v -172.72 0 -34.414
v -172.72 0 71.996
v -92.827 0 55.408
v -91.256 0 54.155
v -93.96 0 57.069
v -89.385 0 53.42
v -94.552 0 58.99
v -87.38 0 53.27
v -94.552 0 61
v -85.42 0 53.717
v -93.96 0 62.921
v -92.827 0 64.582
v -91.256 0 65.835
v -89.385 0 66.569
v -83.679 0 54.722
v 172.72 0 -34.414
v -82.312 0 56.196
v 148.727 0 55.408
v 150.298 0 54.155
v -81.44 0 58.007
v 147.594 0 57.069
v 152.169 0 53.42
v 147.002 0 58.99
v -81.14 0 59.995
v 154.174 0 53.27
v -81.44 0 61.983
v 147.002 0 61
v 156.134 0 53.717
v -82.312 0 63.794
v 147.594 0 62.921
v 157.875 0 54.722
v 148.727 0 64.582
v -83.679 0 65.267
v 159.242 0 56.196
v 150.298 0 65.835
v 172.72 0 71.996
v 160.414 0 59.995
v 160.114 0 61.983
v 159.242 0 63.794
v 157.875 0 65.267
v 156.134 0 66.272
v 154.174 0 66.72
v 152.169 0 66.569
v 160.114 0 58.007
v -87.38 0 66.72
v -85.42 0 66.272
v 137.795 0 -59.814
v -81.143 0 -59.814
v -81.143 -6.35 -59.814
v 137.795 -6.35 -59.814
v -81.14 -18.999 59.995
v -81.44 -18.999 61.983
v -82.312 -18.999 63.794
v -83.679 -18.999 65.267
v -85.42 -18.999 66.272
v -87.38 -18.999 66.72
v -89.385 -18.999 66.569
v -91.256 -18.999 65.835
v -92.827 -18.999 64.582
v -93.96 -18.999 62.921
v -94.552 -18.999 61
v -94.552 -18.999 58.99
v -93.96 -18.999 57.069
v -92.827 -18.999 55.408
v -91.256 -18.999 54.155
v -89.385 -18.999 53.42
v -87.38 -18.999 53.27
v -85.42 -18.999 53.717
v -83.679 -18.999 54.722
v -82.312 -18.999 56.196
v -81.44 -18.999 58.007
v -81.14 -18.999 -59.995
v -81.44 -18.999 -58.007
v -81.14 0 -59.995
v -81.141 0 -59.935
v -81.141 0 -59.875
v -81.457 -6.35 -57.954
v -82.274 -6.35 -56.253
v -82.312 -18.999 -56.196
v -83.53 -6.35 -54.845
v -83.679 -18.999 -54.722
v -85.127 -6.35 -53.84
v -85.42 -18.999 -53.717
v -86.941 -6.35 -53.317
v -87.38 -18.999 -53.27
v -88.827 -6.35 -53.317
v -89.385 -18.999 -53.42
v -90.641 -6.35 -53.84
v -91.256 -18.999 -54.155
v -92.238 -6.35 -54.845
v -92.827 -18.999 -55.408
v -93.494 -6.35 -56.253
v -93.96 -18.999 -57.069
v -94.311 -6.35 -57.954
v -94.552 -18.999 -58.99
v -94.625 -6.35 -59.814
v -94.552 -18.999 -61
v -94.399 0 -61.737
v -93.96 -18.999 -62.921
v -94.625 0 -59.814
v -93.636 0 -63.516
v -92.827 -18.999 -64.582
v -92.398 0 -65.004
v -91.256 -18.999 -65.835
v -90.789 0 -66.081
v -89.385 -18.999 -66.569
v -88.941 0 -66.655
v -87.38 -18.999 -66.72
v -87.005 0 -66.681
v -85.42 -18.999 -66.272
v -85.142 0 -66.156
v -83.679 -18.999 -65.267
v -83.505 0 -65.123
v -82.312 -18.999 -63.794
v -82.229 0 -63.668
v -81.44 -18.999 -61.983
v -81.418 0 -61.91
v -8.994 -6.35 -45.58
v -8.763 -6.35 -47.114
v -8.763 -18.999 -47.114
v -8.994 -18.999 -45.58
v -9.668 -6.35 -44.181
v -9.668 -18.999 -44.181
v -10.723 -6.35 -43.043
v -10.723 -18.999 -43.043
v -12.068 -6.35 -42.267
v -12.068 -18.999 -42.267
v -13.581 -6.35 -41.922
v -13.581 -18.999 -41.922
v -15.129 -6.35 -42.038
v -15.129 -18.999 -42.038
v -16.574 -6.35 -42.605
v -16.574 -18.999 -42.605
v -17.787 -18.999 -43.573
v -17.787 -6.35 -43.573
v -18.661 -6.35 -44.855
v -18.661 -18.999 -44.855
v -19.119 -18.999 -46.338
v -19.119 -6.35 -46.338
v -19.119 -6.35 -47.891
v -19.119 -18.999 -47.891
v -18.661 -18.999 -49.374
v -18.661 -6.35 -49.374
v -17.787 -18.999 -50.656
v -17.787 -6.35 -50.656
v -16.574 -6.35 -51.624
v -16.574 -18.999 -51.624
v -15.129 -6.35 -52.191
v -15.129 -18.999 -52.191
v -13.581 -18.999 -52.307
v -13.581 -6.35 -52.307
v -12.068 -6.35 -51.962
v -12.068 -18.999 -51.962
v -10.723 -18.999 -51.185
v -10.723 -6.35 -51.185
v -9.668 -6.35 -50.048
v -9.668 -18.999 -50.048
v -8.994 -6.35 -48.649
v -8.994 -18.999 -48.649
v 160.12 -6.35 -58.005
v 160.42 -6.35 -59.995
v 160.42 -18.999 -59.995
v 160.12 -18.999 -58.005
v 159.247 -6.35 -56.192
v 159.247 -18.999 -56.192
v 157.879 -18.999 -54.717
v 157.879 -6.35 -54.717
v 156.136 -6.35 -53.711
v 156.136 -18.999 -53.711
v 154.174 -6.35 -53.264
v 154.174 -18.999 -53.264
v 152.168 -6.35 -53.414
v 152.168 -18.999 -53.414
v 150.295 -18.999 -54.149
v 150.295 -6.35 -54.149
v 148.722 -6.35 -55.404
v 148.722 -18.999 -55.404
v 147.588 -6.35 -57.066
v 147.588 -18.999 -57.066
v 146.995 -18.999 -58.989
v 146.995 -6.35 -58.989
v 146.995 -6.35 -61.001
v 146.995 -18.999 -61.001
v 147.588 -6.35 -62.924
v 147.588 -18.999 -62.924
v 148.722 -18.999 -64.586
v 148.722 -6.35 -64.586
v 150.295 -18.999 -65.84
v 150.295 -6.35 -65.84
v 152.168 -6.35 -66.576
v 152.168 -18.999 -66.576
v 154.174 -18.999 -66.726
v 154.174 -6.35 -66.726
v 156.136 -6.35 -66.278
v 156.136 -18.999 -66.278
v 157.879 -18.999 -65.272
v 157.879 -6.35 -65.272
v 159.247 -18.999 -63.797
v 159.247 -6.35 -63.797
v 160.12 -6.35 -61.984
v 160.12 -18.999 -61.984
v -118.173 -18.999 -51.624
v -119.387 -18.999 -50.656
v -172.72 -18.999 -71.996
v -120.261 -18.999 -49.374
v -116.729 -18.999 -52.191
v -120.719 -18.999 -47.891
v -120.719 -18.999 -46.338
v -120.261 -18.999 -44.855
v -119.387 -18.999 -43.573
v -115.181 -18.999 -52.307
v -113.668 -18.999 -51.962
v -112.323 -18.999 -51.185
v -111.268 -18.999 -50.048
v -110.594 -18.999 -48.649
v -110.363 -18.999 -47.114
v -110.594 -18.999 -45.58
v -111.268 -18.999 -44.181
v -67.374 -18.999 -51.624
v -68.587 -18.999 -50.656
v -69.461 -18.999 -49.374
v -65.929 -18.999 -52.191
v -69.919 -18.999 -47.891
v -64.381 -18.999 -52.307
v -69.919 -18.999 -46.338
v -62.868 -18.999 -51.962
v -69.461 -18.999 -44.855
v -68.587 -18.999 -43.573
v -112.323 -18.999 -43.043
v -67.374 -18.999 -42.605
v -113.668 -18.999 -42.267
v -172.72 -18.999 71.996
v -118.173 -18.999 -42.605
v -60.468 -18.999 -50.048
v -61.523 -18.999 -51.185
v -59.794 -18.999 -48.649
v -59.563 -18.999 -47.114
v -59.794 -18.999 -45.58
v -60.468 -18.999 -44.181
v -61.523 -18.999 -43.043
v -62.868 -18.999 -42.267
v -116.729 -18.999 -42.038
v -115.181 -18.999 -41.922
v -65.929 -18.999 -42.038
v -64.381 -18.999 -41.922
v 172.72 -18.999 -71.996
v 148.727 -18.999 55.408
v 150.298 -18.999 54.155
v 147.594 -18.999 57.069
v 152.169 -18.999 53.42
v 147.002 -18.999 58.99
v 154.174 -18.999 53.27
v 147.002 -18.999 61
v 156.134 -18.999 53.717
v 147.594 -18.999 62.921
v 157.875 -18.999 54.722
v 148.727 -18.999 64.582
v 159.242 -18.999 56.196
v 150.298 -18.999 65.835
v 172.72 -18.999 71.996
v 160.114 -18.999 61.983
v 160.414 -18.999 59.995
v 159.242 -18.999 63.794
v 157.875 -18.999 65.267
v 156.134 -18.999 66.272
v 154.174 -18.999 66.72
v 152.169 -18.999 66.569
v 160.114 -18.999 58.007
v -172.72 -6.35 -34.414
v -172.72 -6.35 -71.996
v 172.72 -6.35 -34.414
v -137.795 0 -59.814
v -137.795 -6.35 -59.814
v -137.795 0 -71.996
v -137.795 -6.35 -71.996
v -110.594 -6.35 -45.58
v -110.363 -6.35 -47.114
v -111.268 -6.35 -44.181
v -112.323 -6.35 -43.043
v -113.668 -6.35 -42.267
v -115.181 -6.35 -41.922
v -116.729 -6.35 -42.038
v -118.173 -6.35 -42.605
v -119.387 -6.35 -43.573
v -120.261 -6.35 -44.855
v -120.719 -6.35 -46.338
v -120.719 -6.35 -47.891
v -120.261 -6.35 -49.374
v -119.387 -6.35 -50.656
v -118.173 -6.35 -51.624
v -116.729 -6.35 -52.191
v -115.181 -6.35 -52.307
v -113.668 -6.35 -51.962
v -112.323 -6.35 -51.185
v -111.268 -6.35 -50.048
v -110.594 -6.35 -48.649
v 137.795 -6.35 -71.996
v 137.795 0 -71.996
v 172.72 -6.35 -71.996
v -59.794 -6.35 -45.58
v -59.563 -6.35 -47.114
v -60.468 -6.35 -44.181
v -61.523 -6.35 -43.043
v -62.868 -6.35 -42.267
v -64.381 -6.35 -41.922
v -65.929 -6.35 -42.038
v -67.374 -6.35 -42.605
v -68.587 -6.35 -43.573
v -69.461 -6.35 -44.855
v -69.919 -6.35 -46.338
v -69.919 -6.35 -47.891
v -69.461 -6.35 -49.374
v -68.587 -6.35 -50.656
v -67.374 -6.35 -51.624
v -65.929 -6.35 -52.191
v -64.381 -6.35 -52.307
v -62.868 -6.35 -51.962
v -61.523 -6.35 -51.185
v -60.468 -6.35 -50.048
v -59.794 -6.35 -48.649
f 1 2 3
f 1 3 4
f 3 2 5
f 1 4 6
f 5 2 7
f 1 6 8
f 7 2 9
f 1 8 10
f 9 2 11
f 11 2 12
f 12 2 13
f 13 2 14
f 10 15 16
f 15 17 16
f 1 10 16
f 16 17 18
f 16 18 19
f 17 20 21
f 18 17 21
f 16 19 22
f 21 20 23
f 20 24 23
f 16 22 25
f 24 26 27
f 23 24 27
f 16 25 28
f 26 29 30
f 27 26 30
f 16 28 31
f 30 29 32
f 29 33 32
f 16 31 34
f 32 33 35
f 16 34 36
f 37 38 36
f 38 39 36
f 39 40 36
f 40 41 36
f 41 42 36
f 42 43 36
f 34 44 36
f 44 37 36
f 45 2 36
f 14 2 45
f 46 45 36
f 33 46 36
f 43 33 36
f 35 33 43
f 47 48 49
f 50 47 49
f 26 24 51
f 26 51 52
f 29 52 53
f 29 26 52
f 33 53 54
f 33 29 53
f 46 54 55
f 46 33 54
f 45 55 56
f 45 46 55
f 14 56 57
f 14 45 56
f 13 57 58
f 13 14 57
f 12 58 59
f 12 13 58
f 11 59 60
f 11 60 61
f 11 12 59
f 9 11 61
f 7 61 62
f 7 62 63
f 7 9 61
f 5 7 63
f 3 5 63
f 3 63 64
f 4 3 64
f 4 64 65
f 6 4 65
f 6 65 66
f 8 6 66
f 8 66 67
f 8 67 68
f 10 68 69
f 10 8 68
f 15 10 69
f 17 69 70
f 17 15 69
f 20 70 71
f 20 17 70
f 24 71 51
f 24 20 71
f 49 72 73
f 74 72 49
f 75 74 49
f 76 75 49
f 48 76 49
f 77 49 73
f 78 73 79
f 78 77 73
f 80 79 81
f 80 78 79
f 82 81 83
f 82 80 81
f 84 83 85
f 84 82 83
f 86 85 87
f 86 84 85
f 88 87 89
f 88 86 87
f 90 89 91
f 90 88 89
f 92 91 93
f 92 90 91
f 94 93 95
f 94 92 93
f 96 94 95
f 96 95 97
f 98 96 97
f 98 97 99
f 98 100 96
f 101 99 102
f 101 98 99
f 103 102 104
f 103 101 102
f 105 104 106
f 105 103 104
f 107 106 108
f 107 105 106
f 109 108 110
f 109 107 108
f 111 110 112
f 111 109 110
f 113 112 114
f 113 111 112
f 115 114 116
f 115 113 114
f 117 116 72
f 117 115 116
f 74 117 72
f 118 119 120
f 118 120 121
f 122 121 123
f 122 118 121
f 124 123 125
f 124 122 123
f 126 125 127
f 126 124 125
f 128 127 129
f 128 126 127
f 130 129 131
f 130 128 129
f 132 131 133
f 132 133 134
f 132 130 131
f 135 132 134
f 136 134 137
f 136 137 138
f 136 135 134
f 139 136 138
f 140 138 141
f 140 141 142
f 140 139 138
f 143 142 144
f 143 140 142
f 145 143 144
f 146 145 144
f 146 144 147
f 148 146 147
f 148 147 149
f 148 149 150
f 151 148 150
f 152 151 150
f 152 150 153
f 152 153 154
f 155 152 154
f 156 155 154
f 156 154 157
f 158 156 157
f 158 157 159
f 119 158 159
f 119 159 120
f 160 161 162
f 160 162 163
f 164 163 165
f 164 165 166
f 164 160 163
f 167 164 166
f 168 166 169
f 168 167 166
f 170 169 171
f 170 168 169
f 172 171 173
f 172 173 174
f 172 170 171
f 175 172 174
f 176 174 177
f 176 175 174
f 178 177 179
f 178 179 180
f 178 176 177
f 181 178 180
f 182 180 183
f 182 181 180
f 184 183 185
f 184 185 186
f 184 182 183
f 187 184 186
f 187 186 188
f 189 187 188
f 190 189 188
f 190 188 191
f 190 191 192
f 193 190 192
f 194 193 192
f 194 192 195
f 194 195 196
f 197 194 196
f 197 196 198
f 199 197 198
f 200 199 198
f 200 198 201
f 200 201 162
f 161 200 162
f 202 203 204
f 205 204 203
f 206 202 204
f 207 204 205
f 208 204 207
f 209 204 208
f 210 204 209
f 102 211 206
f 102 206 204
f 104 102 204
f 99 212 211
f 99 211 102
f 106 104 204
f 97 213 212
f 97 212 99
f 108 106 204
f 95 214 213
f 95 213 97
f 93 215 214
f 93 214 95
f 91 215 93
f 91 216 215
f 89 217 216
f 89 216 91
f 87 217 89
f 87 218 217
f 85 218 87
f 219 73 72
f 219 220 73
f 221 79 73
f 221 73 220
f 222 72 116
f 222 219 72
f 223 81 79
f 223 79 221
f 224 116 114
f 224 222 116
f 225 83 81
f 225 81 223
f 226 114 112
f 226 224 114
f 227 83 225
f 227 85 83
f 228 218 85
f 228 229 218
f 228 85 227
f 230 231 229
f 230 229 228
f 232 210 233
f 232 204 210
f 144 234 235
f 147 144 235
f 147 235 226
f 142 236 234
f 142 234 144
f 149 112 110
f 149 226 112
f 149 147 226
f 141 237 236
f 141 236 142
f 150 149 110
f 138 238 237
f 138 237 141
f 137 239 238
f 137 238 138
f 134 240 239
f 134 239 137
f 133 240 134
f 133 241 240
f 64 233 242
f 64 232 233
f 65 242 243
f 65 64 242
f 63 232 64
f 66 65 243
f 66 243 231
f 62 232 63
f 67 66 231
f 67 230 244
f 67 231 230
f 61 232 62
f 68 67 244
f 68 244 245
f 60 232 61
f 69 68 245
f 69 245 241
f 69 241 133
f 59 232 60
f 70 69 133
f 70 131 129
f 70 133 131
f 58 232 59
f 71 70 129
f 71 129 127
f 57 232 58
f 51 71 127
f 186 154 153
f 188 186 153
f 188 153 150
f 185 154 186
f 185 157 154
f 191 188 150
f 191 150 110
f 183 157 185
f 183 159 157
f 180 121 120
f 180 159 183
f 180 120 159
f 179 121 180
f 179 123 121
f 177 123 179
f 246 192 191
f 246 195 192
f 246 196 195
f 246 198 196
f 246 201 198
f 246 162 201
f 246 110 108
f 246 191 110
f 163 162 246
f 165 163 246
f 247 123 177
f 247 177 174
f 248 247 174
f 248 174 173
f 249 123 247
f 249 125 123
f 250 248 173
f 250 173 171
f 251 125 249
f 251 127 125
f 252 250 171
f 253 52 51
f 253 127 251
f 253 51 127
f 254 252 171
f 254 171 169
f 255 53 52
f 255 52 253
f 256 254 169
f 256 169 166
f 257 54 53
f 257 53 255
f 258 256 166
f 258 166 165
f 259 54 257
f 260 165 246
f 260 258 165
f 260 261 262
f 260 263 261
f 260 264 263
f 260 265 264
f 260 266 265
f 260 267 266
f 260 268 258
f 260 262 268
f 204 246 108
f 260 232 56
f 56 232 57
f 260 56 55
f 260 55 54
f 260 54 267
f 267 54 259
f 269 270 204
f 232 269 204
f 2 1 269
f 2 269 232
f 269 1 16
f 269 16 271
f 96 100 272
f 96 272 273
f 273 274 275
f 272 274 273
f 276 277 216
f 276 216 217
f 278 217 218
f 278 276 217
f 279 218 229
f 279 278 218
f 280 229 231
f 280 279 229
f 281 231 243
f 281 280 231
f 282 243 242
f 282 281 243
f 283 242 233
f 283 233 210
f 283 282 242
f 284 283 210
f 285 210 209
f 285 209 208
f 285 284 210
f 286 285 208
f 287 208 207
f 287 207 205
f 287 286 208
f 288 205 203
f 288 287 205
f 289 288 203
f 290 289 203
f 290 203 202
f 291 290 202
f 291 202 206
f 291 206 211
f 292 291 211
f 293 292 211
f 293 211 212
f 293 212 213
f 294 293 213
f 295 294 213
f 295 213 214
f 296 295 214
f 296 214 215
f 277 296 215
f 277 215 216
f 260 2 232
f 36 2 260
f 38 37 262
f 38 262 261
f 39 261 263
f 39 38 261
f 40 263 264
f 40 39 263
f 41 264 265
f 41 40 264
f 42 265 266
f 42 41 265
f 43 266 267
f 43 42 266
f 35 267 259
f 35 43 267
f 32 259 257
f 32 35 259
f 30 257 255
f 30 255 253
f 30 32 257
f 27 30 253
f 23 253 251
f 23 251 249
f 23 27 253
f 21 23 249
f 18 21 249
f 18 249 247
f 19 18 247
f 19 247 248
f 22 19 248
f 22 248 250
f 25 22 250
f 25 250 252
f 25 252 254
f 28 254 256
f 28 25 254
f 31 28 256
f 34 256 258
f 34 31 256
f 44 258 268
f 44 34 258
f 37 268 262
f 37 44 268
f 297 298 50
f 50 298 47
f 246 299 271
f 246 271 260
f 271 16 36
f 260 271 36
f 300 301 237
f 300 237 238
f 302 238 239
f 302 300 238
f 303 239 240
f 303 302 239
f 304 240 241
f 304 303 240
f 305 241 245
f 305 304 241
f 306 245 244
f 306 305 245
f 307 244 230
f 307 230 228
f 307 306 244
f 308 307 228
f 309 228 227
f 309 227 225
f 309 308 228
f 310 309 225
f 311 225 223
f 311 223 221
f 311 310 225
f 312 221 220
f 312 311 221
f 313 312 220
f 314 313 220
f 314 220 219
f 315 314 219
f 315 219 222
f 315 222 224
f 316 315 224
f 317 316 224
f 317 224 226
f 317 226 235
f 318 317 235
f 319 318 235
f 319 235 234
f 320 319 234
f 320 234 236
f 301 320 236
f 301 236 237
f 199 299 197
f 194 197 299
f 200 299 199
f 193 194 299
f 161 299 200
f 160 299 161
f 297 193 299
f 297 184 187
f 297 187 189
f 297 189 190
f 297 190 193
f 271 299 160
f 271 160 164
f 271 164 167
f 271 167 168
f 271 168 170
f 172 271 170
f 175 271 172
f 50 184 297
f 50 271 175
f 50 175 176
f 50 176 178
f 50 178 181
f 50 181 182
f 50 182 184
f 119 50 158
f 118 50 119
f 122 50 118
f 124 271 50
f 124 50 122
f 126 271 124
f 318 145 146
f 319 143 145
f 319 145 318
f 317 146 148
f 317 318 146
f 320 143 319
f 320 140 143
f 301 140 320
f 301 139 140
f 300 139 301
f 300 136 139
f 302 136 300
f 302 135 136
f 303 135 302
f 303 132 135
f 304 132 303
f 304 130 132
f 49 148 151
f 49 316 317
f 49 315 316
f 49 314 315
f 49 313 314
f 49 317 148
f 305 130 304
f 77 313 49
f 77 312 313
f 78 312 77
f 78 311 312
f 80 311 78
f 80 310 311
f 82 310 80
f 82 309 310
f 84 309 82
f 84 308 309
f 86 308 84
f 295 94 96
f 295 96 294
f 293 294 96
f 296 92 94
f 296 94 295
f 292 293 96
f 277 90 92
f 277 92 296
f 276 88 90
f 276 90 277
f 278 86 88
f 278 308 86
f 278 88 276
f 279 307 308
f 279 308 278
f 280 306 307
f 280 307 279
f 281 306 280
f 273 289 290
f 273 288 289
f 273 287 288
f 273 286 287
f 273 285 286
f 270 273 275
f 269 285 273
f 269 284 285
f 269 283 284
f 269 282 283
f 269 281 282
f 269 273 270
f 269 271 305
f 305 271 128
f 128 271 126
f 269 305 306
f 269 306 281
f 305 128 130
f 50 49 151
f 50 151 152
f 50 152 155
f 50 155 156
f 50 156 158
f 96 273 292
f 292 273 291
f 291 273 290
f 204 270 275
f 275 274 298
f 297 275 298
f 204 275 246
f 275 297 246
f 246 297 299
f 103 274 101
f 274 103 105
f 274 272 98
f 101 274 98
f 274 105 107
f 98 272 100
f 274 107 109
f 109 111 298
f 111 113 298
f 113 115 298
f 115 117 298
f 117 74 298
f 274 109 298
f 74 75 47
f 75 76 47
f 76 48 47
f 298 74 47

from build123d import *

# Parameters (mm, degrees)
F0_W     = 345.44
F0_H     = 143.9926
F0_R     = 6.7437
F0_R_2   = 5.207
F0_R_3   = 6.75
F1_DEPTH = 18.9992
F2_W     = 6.35
F2_H     = 25.4
F3_DEPTH = 345.441
F4_W     = 34.925
F4_H     = 37.58184
F5_DEPTH = 6.35


with BuildPart() as f1:
    # F0 (on Front) → F1 (new body)
    with BuildSketch(Plane.XZ):
        Rectangle(F0_W, F0_H)
        with Locations((-87.884, -59.9948)):
            Circle(F0_R, mode=Mode.SUBTRACT)
        with Locations((-115.57, -47.11446)):
            Circle(F0_R_2, mode=Mode.SUBTRACT)
        with Locations((-64.77, -47.11446)):
            Circle(F0_R_2, mode=Mode.SUBTRACT)
        with Locations((-13.97, -47.11446)):
            Circle(F0_R_2, mode=Mode.SUBTRACT)
        with Locations((153.67, -59.9948)):
            Circle(F0_R_3, mode=Mode.SUBTRACT)
        with Locations((-87.884, 59.9948)):
            Circle(F0_R, mode=Mode.SUBTRACT)
        with Locations((153.67, 59.9948)):
            Circle(F0_R, mode=Mode.SUBTRACT)
    extrude(amount=F1_DEPTH)

    # F2 (on face) → F3 (cut, through all)
    with BuildSketch(Plane(origin=(-172.72, 0, 0), x_dir=(0, -1, 0), z_dir=(-1, 0, 0))):
        with Locations((3.175, -47.11446)):
            Rectangle(F2_W, F2_H)
    extrude(amount=-F3_DEPTH, mode=Mode.SUBTRACT)

    # F4 (on face) → F5 (cut, through all)
    with BuildSketch(Plane(origin=(0, 0, 0), x_dir=(-1, 0, 0), z_dir=(0, 1, 0))):
        with Locations((-155.2575, -53.20538)):
            Rectangle(F4_W, F4_H)
        with Locations((155.2575, -53.20538)):
            Rectangle(F4_W, F4_H)
    extrude(amount=-F5_DEPTH, mode=Mode.SUBTRACT)


solid = f1.part
